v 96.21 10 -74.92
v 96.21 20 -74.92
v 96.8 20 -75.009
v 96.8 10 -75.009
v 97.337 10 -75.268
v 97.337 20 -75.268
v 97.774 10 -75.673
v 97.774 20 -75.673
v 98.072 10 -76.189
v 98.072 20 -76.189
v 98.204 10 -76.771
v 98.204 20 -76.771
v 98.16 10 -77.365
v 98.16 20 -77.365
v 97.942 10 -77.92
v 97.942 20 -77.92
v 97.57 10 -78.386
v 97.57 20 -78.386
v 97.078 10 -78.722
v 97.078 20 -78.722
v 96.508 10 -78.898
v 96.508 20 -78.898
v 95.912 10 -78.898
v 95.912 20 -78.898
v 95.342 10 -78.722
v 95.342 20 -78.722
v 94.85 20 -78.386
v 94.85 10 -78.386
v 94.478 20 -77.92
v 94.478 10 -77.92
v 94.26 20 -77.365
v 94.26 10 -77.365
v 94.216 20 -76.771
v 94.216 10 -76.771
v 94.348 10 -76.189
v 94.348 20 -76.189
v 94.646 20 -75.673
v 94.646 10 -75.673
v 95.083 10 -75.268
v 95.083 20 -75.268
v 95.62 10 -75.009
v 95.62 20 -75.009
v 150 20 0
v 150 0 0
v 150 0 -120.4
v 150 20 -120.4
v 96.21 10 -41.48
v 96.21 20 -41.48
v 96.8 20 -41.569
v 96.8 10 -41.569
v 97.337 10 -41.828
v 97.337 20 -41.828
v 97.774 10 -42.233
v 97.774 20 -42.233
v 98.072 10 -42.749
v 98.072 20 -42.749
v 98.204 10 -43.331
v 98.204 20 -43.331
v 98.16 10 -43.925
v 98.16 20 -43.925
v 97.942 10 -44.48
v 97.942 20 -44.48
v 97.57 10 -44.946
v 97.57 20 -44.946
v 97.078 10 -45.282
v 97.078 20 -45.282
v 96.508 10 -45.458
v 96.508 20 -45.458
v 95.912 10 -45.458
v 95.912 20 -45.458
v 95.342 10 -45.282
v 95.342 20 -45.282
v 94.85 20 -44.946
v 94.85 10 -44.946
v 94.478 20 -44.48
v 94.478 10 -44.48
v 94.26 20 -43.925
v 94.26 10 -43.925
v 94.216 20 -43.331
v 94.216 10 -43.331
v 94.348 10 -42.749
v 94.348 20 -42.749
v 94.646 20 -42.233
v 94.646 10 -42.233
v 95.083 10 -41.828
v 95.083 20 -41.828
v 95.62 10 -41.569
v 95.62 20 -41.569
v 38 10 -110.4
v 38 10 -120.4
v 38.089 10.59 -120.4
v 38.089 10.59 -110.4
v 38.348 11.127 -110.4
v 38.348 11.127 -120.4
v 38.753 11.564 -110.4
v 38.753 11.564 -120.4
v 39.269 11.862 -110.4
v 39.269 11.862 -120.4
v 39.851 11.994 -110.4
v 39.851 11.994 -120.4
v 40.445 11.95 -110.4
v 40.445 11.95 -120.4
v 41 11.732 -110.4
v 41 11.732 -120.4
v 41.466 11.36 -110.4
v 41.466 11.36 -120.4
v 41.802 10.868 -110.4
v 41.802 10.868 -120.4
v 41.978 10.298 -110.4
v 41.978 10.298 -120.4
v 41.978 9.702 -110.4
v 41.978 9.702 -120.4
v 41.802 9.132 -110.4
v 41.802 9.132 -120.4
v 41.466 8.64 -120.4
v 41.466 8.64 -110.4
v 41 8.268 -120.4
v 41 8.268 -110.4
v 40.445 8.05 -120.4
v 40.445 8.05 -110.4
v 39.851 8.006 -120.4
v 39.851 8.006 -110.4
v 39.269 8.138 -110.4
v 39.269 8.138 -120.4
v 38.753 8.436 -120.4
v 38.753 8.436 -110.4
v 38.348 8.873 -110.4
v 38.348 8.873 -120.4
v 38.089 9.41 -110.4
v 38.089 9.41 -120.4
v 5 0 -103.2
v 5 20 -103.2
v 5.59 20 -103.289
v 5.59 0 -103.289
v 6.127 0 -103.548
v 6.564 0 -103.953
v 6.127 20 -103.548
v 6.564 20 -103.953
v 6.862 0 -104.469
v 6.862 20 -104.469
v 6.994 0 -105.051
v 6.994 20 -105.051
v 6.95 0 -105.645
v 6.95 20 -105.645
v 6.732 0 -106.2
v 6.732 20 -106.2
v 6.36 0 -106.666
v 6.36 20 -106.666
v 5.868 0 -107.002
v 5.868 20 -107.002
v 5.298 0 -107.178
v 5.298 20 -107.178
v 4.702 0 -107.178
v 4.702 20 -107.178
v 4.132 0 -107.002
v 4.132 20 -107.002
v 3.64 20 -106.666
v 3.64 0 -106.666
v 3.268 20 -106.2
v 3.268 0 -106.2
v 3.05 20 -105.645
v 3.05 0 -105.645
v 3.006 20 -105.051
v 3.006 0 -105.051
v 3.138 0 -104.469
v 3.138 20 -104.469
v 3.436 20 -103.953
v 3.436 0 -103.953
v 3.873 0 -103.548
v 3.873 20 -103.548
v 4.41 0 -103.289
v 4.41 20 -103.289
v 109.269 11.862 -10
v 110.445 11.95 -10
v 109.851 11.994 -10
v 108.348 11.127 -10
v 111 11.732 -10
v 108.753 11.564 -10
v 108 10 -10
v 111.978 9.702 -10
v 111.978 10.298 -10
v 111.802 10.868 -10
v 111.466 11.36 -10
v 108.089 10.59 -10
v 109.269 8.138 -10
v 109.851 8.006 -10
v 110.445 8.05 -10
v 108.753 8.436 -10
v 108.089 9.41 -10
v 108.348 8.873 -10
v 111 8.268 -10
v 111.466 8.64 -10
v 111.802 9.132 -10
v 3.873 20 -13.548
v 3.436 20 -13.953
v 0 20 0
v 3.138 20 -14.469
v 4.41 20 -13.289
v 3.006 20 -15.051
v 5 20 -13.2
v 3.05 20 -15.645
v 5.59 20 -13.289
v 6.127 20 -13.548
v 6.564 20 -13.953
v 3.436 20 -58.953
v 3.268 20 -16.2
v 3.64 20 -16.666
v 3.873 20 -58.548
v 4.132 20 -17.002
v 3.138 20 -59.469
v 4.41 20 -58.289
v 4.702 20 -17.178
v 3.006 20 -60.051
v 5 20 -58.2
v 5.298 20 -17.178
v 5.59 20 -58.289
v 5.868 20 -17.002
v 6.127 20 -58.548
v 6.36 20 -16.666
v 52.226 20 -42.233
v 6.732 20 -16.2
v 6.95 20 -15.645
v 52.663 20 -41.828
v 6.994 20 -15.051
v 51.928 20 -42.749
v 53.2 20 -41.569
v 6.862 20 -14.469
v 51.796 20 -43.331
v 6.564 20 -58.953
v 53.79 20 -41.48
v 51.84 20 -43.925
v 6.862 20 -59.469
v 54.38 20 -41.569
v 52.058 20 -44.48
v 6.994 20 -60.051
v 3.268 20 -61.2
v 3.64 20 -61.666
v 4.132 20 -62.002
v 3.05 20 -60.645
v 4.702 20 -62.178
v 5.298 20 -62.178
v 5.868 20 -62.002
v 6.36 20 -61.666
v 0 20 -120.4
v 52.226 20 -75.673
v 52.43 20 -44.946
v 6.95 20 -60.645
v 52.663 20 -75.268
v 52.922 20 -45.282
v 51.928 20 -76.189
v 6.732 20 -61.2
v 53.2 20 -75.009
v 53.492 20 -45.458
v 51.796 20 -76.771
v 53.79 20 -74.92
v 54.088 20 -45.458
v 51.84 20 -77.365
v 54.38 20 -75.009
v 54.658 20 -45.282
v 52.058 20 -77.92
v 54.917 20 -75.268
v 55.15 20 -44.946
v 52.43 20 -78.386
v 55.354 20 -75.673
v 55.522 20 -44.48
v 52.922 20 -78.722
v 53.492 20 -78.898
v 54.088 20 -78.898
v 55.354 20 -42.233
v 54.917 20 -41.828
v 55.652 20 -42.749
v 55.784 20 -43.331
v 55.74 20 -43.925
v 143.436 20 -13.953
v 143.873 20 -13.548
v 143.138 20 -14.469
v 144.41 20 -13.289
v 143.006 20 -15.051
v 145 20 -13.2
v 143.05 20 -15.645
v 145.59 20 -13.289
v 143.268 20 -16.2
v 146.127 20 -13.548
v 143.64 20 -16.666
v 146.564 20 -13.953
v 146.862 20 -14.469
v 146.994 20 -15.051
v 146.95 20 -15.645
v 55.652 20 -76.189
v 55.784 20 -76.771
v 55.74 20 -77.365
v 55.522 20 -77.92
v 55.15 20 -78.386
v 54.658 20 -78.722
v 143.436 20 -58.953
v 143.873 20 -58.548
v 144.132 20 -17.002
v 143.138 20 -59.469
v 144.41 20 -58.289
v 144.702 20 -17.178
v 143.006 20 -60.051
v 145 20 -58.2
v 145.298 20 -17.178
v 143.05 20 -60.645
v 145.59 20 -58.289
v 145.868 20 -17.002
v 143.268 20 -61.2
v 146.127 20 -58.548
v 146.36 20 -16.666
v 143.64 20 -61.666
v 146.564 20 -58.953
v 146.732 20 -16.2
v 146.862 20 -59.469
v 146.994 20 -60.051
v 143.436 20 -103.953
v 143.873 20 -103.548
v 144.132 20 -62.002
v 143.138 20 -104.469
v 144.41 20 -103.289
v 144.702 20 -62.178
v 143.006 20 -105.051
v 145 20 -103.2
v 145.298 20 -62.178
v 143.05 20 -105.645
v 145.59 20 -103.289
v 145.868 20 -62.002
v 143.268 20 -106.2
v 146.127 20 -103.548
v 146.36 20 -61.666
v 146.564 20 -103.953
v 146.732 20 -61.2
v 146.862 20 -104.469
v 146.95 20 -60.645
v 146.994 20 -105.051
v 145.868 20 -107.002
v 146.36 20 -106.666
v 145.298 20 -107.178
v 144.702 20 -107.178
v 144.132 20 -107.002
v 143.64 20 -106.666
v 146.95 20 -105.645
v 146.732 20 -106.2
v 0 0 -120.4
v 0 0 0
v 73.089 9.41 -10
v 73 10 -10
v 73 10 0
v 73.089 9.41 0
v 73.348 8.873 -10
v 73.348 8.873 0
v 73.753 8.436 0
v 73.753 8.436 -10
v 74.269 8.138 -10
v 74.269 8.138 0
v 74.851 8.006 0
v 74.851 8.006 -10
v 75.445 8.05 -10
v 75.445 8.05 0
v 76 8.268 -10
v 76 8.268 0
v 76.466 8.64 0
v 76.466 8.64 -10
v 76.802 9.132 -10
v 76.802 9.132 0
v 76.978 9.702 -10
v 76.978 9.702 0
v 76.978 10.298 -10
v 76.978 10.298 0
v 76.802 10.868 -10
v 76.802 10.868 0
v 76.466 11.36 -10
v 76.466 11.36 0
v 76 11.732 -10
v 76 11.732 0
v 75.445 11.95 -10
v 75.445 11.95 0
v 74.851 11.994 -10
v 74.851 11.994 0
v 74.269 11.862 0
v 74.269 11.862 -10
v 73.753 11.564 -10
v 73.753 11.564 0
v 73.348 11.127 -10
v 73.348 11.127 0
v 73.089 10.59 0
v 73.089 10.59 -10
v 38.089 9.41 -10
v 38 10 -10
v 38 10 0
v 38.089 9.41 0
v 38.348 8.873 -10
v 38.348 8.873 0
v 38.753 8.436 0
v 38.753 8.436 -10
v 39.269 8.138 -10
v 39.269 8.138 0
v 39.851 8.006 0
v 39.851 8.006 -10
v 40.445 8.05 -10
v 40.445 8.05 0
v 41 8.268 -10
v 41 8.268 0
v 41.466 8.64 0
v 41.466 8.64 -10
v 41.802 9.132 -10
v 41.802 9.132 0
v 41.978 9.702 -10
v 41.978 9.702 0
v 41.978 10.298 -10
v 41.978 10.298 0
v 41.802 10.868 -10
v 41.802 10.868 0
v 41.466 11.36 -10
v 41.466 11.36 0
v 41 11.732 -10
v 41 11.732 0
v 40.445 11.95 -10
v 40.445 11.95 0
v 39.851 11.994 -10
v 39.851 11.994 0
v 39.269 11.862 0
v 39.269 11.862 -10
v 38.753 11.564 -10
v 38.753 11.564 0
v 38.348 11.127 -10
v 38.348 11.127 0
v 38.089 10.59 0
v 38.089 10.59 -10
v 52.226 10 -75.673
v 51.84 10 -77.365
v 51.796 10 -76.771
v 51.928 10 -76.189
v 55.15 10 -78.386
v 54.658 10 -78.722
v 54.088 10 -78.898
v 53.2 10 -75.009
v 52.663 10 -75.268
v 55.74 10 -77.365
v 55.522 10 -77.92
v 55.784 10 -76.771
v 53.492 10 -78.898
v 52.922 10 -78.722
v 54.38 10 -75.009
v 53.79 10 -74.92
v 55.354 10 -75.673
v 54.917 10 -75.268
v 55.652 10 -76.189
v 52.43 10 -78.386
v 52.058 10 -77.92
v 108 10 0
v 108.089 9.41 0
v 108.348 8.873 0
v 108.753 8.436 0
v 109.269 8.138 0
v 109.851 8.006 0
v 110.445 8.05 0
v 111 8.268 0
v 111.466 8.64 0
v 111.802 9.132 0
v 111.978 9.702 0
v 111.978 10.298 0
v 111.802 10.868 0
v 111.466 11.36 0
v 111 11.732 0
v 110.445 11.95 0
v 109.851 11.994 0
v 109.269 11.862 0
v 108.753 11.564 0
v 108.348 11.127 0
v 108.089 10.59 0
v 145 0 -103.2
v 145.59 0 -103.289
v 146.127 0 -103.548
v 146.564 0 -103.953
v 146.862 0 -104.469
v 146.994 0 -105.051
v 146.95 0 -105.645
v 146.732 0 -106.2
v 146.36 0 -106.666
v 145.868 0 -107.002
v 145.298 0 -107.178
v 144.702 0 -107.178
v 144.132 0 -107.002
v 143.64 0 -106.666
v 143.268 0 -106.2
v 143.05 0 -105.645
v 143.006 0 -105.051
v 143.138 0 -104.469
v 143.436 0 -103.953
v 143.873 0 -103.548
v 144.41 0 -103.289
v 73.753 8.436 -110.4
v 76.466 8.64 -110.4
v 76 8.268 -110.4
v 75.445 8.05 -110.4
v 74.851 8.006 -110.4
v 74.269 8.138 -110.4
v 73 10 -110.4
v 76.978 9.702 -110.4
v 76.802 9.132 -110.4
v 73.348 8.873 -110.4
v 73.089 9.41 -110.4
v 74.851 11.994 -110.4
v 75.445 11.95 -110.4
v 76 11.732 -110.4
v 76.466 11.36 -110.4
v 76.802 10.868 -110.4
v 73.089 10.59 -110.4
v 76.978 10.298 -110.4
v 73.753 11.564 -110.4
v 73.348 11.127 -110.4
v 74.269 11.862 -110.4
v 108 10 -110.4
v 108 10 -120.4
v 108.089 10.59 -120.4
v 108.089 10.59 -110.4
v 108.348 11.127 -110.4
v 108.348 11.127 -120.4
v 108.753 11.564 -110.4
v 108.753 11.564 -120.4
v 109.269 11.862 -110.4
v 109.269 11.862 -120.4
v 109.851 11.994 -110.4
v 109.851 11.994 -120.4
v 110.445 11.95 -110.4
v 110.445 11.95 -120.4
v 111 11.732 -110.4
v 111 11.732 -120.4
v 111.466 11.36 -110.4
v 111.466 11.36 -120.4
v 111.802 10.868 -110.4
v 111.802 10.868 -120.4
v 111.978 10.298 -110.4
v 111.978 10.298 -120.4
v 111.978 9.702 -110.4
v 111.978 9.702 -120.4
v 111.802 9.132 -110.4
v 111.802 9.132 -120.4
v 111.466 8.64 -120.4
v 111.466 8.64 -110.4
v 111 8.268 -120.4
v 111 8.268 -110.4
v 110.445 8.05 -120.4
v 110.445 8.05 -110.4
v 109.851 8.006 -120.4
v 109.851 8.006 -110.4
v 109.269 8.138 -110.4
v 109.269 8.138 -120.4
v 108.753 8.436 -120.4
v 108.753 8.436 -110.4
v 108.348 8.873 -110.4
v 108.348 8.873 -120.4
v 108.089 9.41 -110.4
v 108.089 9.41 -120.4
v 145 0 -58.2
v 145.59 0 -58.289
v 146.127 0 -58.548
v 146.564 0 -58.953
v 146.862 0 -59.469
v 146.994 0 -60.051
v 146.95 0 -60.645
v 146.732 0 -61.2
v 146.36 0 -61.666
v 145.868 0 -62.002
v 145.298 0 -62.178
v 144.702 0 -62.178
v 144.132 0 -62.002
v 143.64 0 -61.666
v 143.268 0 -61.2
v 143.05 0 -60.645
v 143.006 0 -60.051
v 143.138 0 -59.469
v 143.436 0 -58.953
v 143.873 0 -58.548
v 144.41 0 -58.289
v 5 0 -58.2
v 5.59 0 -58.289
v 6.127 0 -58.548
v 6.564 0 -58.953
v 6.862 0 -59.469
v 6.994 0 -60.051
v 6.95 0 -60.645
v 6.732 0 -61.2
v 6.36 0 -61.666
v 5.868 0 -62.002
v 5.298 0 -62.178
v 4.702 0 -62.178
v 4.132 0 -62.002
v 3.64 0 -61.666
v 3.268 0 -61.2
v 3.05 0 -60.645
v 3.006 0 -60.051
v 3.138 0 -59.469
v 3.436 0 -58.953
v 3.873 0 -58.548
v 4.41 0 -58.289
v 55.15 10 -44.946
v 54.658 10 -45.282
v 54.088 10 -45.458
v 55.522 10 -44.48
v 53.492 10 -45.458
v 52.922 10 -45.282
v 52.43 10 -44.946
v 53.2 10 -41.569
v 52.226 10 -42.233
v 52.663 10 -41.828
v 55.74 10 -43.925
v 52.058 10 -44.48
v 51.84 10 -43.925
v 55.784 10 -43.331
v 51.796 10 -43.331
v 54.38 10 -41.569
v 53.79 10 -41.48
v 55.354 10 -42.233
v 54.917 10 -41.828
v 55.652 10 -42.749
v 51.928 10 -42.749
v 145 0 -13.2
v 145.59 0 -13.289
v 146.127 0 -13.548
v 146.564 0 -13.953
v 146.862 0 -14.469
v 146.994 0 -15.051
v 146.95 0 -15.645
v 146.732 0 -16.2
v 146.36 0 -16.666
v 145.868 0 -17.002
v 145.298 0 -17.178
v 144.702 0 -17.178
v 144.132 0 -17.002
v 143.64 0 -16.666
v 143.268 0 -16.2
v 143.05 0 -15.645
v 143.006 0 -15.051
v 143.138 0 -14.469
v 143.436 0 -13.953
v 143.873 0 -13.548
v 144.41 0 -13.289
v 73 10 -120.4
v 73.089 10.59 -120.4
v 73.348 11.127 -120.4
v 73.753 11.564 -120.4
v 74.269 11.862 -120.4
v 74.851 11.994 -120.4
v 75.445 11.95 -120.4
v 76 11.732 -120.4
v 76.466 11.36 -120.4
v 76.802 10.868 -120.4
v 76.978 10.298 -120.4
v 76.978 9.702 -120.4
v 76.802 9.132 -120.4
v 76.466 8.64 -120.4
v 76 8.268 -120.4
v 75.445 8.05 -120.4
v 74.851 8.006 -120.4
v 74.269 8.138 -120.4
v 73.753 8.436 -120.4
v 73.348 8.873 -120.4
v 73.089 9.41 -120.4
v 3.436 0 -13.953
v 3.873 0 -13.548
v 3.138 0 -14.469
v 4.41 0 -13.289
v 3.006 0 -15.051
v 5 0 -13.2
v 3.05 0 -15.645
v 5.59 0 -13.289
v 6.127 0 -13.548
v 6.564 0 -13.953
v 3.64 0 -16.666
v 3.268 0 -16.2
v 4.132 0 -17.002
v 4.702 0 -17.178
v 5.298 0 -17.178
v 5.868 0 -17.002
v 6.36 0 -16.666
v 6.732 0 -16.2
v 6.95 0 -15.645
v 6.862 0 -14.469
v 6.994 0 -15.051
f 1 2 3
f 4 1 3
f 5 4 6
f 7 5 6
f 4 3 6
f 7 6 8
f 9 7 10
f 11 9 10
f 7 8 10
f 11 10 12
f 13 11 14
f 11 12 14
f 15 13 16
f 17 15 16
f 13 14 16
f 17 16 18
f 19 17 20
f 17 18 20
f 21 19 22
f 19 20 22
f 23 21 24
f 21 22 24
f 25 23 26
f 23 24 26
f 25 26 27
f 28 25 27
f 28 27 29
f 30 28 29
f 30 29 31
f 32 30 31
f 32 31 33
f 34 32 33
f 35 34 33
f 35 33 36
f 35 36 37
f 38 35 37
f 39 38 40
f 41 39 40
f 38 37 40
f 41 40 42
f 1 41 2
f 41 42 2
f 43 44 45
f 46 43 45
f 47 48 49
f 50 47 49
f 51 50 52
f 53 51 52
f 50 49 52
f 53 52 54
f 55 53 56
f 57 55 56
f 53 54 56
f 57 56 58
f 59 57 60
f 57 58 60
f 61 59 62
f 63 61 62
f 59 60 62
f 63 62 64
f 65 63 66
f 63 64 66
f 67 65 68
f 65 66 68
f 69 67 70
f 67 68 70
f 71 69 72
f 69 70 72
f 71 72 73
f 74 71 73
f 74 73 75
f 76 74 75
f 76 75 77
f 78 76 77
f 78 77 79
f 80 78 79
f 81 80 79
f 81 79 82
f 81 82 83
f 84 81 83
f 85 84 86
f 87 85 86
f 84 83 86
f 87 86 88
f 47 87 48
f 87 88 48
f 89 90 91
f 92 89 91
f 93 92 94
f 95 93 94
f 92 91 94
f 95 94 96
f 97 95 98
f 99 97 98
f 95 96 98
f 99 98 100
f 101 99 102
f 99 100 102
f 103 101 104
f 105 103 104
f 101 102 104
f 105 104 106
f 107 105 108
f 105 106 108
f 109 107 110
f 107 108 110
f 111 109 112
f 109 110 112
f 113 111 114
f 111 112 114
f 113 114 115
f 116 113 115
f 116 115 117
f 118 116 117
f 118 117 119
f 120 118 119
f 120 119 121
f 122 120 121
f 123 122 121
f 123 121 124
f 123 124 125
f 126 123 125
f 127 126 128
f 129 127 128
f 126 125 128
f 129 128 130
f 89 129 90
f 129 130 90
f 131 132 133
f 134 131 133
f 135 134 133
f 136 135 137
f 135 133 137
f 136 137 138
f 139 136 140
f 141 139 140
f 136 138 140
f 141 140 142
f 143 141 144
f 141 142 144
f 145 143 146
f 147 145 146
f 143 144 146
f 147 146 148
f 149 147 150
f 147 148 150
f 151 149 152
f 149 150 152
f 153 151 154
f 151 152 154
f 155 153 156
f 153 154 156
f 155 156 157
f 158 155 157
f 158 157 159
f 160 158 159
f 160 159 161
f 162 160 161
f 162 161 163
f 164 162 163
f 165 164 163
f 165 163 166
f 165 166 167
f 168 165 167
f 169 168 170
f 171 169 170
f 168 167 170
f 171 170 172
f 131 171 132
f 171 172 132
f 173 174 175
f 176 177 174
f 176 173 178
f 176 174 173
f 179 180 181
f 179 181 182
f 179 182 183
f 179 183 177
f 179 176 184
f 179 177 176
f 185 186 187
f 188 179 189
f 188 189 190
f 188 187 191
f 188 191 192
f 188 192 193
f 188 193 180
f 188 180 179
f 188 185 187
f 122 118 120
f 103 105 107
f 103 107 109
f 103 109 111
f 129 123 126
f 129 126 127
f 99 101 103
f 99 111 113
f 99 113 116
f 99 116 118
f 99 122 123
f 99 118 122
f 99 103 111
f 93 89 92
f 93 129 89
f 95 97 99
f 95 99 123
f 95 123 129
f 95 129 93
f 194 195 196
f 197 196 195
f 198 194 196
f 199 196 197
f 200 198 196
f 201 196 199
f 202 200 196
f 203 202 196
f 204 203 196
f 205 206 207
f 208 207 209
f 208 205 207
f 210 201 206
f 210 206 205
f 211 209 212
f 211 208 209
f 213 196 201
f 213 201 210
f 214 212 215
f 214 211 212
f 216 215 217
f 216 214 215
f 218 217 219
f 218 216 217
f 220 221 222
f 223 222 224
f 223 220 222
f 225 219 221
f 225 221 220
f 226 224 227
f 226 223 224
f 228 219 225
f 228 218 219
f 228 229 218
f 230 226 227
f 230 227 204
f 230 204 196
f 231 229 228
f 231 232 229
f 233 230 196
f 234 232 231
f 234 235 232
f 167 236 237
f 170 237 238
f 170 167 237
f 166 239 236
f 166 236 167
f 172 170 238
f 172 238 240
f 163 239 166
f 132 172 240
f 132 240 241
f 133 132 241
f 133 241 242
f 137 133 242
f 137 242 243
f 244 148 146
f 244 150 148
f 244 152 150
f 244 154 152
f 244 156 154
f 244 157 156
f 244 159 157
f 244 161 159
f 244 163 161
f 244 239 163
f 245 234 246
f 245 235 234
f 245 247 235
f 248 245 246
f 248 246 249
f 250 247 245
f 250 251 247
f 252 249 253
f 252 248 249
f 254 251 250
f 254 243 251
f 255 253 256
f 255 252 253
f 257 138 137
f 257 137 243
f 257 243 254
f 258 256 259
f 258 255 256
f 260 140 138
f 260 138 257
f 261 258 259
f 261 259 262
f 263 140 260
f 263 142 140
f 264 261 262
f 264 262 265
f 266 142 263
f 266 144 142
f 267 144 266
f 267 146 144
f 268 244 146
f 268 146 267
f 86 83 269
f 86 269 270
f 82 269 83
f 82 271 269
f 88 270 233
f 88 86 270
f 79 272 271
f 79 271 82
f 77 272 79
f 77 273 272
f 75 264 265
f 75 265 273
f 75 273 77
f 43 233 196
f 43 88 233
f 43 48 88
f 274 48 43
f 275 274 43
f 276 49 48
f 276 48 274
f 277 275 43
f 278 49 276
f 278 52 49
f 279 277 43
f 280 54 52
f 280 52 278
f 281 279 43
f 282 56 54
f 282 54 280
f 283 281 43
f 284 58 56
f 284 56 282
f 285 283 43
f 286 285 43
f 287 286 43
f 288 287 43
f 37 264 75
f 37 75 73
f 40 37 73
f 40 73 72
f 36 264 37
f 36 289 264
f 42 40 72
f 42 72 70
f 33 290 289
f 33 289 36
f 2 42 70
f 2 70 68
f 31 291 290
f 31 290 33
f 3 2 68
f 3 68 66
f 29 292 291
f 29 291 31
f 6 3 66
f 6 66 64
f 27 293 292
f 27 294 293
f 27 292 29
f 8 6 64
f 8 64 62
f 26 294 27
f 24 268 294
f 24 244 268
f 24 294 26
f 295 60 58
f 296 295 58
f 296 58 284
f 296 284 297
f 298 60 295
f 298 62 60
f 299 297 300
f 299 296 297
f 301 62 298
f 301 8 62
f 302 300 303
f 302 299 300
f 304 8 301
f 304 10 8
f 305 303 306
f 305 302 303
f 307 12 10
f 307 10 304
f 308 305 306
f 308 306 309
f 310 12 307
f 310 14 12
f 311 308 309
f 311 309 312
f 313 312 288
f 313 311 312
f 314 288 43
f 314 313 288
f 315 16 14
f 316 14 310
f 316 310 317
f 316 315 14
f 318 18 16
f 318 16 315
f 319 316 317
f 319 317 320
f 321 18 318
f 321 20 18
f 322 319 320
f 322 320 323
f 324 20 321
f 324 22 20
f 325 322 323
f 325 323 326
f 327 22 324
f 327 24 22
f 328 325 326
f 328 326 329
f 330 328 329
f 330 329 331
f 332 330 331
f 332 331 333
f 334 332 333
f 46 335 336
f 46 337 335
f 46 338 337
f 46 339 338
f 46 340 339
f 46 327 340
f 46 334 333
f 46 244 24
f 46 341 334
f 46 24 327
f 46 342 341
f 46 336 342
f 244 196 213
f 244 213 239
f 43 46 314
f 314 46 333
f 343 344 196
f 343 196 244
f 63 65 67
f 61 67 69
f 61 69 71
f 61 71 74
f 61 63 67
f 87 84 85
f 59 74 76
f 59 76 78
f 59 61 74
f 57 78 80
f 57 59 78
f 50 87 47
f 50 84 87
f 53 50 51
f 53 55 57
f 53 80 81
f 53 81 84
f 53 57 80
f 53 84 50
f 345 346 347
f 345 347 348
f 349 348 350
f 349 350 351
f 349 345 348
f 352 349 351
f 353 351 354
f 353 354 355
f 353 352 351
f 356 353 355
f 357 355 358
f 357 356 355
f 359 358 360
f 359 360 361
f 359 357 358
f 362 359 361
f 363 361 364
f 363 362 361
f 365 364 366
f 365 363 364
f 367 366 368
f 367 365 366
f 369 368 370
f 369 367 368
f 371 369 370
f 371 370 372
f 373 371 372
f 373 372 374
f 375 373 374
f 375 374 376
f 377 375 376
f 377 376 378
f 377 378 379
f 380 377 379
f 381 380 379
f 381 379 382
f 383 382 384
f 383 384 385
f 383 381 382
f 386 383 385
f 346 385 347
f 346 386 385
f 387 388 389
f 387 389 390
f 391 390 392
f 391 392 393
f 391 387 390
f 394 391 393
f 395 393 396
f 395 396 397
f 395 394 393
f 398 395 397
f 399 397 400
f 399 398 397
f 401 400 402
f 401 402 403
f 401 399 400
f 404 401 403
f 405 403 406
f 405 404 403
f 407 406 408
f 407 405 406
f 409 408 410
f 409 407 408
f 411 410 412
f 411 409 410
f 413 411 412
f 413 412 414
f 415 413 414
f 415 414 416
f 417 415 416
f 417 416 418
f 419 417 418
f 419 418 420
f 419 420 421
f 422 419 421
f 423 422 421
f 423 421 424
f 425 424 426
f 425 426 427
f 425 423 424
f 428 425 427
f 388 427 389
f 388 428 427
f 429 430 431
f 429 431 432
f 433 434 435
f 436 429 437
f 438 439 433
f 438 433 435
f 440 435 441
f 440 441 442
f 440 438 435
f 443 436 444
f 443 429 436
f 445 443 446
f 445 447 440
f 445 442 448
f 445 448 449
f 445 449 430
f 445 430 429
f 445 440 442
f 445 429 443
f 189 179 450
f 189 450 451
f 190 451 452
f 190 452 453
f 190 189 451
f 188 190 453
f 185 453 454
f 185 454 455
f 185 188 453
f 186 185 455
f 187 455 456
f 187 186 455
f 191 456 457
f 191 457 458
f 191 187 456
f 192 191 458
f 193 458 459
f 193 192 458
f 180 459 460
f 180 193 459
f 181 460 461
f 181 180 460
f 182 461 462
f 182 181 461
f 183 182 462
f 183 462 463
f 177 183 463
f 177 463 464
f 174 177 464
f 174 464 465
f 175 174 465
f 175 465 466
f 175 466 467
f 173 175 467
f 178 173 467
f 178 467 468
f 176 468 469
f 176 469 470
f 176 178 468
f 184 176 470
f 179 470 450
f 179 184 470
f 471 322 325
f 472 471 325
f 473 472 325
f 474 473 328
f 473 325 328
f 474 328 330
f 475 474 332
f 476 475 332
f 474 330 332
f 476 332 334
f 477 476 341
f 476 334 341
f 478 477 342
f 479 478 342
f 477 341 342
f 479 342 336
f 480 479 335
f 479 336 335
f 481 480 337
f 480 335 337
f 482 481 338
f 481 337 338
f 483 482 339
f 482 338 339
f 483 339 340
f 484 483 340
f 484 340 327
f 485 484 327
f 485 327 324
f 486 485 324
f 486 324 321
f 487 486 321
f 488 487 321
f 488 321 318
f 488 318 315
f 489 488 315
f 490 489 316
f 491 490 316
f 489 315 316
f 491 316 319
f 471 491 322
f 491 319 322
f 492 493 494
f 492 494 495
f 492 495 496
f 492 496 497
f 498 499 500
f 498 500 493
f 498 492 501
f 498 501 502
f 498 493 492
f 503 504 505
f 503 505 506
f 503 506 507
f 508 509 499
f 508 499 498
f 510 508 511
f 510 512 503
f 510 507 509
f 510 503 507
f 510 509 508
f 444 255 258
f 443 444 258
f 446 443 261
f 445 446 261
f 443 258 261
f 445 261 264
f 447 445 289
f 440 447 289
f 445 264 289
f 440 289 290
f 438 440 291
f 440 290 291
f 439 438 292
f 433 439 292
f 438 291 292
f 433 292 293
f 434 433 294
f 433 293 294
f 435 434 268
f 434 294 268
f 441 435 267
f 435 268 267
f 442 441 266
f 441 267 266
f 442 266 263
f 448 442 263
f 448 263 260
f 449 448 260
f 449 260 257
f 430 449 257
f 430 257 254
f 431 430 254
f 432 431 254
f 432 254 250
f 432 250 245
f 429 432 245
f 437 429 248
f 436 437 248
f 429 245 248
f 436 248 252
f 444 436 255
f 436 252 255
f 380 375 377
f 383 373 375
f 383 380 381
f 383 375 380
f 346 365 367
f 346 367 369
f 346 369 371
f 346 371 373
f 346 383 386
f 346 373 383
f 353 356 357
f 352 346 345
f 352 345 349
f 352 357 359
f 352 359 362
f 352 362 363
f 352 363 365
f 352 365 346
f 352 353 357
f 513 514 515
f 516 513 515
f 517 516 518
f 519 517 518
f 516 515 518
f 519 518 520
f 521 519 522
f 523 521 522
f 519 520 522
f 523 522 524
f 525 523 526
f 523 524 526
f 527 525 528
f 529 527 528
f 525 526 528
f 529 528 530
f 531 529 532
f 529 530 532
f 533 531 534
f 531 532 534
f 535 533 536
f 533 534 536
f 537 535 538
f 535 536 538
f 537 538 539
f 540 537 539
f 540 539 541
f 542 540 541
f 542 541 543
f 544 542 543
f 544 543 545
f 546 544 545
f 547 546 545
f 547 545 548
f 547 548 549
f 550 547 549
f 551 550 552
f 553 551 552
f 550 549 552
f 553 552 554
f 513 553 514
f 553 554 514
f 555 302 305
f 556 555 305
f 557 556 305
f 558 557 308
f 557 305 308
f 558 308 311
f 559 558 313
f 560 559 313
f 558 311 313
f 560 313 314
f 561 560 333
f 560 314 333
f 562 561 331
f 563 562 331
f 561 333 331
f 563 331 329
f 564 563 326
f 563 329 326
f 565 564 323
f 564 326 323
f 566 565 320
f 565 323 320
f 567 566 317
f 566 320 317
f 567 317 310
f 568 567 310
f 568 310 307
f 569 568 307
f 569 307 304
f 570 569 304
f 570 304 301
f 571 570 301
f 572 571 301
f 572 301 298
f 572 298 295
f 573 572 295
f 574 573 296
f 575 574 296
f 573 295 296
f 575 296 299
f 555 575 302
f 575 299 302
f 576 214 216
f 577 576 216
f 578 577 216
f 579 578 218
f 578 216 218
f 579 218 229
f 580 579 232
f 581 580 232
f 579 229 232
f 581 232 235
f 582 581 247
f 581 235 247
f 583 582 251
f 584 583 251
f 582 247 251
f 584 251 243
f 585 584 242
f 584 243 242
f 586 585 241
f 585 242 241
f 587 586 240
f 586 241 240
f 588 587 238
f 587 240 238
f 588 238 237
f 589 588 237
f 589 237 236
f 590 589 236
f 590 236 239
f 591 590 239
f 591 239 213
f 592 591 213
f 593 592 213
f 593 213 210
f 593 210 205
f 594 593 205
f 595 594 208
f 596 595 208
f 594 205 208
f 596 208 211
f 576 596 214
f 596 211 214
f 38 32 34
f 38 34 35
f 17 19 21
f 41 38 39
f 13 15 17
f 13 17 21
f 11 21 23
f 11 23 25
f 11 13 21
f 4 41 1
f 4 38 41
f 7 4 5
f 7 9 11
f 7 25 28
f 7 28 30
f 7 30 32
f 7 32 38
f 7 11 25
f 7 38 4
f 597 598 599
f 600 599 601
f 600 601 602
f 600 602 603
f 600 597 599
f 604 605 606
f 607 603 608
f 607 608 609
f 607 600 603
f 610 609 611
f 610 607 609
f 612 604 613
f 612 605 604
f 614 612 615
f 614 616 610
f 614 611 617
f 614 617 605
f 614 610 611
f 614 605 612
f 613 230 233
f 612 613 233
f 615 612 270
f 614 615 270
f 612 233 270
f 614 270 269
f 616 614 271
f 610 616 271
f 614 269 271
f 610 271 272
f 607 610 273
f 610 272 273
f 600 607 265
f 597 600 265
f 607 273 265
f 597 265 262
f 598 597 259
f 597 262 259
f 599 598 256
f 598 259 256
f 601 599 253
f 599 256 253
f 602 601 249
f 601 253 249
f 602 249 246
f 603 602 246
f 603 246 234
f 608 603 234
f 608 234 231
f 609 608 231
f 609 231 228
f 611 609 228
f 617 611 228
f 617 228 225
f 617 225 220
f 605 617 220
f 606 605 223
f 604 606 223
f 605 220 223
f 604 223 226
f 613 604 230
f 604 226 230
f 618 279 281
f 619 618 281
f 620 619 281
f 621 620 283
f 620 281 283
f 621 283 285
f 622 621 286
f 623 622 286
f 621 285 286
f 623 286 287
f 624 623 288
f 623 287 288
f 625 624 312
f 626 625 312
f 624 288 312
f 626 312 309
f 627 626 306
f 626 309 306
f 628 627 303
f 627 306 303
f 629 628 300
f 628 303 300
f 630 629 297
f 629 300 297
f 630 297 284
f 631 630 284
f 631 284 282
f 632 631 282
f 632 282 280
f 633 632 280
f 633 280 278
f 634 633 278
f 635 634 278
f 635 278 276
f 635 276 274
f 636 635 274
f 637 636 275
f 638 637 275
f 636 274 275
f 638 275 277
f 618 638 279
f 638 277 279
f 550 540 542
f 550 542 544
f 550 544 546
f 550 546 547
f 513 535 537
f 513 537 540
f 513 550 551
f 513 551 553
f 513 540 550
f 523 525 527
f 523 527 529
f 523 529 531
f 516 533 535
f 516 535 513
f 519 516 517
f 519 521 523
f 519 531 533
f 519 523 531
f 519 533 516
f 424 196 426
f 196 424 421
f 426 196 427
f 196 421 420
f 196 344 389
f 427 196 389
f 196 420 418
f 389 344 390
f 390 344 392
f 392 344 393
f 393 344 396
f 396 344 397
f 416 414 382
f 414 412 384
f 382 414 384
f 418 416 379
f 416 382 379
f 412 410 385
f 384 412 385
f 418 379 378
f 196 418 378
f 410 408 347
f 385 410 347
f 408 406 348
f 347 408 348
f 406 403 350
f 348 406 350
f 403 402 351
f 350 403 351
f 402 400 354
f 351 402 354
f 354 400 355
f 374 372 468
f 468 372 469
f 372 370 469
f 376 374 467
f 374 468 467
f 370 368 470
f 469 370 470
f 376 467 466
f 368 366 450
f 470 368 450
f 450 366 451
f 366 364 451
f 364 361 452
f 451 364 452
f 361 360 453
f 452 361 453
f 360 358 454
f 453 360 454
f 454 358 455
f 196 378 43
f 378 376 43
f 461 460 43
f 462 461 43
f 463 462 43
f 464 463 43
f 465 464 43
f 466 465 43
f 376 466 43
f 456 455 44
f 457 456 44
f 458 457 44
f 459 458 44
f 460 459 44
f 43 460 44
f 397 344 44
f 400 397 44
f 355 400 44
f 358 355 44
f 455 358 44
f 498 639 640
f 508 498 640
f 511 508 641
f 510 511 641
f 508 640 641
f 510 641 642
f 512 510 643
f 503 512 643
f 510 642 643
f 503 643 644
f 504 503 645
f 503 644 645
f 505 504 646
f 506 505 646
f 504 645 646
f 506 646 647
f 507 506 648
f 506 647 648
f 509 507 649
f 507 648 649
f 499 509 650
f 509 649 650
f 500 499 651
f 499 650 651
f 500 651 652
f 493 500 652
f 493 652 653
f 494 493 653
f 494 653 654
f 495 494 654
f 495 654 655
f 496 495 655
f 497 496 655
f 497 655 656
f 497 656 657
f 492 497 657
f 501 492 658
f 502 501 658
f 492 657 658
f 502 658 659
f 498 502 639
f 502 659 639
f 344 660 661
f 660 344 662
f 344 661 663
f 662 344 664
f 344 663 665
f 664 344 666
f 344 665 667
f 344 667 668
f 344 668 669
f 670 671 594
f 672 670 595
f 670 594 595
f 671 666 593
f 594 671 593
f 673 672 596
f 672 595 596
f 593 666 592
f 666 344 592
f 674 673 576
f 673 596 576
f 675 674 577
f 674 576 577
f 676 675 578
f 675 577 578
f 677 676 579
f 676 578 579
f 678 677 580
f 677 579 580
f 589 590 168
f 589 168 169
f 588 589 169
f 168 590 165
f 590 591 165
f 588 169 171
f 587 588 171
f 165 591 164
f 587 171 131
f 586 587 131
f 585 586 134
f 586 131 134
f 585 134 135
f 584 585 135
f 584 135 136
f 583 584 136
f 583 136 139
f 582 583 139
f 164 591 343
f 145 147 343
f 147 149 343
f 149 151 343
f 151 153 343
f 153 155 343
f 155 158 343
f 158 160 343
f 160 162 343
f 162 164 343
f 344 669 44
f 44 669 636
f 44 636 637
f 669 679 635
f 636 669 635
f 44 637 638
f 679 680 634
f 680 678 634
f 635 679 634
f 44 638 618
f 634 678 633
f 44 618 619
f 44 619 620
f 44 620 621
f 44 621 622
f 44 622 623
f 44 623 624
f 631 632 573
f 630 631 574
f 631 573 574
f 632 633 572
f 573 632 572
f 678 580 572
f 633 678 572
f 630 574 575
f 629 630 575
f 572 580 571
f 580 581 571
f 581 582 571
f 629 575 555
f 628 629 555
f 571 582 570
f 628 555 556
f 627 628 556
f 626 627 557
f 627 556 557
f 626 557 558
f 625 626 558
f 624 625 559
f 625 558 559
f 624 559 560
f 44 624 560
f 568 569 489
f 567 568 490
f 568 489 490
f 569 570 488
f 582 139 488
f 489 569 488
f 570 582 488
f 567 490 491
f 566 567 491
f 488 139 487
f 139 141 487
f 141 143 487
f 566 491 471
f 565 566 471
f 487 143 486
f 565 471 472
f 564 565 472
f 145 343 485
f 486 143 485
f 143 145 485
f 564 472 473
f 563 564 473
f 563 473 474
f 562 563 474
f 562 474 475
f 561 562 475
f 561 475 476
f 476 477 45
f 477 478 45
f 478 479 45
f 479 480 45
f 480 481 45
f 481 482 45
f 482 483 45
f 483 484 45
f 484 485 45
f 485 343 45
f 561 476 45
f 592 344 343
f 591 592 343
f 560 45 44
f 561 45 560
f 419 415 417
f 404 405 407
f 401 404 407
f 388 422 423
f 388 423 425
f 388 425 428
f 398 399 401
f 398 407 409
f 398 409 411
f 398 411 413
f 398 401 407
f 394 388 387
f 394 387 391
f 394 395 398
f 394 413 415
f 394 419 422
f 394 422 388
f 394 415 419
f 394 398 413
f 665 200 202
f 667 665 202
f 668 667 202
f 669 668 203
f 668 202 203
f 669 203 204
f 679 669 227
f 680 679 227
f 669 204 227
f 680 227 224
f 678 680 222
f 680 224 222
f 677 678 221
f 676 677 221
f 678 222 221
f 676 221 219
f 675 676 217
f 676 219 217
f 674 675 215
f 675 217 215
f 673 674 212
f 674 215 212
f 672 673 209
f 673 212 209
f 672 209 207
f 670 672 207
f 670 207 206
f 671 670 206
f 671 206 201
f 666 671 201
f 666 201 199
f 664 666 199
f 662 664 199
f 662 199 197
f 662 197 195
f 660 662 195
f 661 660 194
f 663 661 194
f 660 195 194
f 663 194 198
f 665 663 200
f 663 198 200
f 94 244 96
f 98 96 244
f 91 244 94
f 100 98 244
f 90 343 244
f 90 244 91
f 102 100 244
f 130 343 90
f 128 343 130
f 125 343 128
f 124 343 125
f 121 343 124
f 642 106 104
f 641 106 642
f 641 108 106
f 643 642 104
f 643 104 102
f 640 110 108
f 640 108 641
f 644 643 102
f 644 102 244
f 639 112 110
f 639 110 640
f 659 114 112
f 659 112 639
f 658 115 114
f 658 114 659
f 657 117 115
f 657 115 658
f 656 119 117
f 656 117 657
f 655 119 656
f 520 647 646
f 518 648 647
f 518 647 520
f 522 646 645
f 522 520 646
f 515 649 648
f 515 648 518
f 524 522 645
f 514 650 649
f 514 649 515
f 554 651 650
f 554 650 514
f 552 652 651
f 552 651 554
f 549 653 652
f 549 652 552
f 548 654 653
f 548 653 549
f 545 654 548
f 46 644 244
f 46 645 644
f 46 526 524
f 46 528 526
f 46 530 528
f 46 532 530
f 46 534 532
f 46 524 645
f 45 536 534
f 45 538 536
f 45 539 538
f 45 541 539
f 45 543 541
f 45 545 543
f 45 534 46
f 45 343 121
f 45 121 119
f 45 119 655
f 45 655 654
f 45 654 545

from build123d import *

# Parameters (mm, degrees)
SKETCH1_W                  = 150
SKETCH1_H                  = 120.4
BOSS_EXTRUDE2_DEPTH        = 20
SZKIC4_R                   = 2
WYTNIJ_WYCI_GNI_CIE2_DEPTH = 10
WYTNIJ_WYCI_GNI_CIE3_START = -10
SZKIC5_R                   = 2
WYTNIJ_WYCI_GNI_CIE3_DEPTH = 10
SZKIC1_R                   = 2
WYTNIJ_WYCI_GNI_CIE5_DEPTH = 10
SZKIC6_R                   = 2
WYTNIJ_WYCI_GNI_CIE6_DEPTH = 20


with BuildPart() as part:
    # Sketch1 → Boss-Extrude2 (new body)
    with BuildSketch(Plane(origin=(0, 0, 0), x_dir=(1, 0, 0), z_dir=(0, 1, 0))):
        with Locations((75, 60.2)):
            Rectangle(SKETCH1_W, SKETCH1_H)
    extrude(amount=BOSS_EXTRUDE2_DEPTH)

    # Szkic4 → Wytnij-wyciągnięcie2 (cut)
    with BuildSketch(Plane(origin=(0, 0, -120.4), x_dir=(-1, 0, 0), z_dir=(0, 0, -1))):
        with Locations((-40, 10)):
            Circle(SZKIC4_R)
        with Locations((-75, 10)):
            Circle(SZKIC4_R)
        with Locations((-110, 10)):
            Circle(SZKIC4_R)
    extrude(amount=-WYTNIJ_WYCI_GNI_CIE2_DEPTH, mode=Mode.SUBTRACT)

    # Szkic5 → Wytnij-wyciągnięcie3 (cut)
    with BuildSketch(Plane.XY.offset(WYTNIJ_WYCI_GNI_CIE3_START)):
        with Locations(Location((40, 10, 0), (0, 0, 180))):
            Circle(SZKIC5_R)
        with Locations(Location((75, 10, 0), (0, 0, 180))):
            Circle(SZKIC5_R)
        with Locations(Location((110, 10, 0), (0, 0, 180))):
            Circle(SZKIC5_R)
    extrude(amount=WYTNIJ_WYCI_GNI_CIE3_DEPTH, mode=Mode.SUBTRACT)

    # Szkic1 → Wytnij-wyciągnięcie5 (cut)
    with BuildSketch(Plane(origin=(0, 20, 0), x_dir=(1, 0, 0), z_dir=(0, 1, 0))):
        with Locations(Location((53.79, 76.92, 0), (0, 0, 270))):
            Circle(SZKIC1_R)
        with Locations(Location((96.21, 76.92, 0), (0, 0, 270))):
            Circle(SZKIC1_R)
        with Locations(Location((53.79, 43.48, 0), (0, 0, 270))):
            Circle(SZKIC1_R)
        with Locations(Location((96.21, 43.48, 0), (0, 0, 270))):
            Circle(SZKIC1_R)
    extrude(amount=-WYTNIJ_WYCI_GNI_CIE5_DEPTH, mode=Mode.SUBTRACT)

    # Szkic6 → Wytnij-wyciągnięcie6 (cut)
    with BuildSketch(Plane(origin=(0, 20, 0), x_dir=(1, 0, 0), z_dir=(0, 1, 0))):
        with Locations(Location((145, 105.2, 0), (0, 0, 270))):
            Circle(SZKIC6_R)
        with Locations(Location((145, 60.2, 0), (0, 0, 270))):
            Circle(SZKIC6_R)
        with Locations(Location((145, 15.2, 0), (0, 0, 270))):
            Circle(SZKIC6_R)
        with Locations(Location((5, 15.2, 0), (0, 0, 270))):
            Circle(SZKIC6_R)
        with Locations(Location((5, 60.2, 0), (0, 0, 270))):
            Circle(SZKIC6_R)
        with Locations(Location((5, 105.2, 0), (0, 0, 270))):
            Circle(SZKIC6_R)
    extrude(amount=-WYTNIJ_WYCI_GNI_CIE6_DEPTH, mode=Mode.SUBTRACT)


solid = part.part
